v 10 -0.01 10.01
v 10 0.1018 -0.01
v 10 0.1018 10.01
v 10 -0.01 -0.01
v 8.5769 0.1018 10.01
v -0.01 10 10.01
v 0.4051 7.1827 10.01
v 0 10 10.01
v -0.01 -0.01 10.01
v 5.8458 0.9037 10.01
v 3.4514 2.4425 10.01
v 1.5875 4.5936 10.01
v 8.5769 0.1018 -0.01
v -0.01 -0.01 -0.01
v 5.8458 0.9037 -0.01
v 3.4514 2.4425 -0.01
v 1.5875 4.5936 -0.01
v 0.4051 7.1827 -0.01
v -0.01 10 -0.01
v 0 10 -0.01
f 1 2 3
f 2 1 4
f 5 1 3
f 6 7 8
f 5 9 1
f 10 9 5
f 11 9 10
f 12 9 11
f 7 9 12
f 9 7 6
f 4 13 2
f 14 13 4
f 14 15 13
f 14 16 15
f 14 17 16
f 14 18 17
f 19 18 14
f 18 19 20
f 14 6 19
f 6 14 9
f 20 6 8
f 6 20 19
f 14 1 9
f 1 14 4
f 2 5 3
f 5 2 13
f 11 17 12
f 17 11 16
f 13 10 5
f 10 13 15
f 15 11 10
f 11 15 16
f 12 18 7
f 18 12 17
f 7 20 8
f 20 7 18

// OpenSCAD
// rounder.scad
// cutting tool for rounding off corners with a cylinder

//---------------------
module rounder(
r=10,   // radius
h=10,   // height
f=22,    // $fn
extra=0.01  // extra size for the cube
){

difference(){
  translate([-extra,-extra,-extra])
  cube([r+extra,r+extra,h+2*extra]);
  translate([r,r,-1])
  cylinder(r=r,h=h+2,$fn=f);
}

}

//========================

rounder();

//========================
